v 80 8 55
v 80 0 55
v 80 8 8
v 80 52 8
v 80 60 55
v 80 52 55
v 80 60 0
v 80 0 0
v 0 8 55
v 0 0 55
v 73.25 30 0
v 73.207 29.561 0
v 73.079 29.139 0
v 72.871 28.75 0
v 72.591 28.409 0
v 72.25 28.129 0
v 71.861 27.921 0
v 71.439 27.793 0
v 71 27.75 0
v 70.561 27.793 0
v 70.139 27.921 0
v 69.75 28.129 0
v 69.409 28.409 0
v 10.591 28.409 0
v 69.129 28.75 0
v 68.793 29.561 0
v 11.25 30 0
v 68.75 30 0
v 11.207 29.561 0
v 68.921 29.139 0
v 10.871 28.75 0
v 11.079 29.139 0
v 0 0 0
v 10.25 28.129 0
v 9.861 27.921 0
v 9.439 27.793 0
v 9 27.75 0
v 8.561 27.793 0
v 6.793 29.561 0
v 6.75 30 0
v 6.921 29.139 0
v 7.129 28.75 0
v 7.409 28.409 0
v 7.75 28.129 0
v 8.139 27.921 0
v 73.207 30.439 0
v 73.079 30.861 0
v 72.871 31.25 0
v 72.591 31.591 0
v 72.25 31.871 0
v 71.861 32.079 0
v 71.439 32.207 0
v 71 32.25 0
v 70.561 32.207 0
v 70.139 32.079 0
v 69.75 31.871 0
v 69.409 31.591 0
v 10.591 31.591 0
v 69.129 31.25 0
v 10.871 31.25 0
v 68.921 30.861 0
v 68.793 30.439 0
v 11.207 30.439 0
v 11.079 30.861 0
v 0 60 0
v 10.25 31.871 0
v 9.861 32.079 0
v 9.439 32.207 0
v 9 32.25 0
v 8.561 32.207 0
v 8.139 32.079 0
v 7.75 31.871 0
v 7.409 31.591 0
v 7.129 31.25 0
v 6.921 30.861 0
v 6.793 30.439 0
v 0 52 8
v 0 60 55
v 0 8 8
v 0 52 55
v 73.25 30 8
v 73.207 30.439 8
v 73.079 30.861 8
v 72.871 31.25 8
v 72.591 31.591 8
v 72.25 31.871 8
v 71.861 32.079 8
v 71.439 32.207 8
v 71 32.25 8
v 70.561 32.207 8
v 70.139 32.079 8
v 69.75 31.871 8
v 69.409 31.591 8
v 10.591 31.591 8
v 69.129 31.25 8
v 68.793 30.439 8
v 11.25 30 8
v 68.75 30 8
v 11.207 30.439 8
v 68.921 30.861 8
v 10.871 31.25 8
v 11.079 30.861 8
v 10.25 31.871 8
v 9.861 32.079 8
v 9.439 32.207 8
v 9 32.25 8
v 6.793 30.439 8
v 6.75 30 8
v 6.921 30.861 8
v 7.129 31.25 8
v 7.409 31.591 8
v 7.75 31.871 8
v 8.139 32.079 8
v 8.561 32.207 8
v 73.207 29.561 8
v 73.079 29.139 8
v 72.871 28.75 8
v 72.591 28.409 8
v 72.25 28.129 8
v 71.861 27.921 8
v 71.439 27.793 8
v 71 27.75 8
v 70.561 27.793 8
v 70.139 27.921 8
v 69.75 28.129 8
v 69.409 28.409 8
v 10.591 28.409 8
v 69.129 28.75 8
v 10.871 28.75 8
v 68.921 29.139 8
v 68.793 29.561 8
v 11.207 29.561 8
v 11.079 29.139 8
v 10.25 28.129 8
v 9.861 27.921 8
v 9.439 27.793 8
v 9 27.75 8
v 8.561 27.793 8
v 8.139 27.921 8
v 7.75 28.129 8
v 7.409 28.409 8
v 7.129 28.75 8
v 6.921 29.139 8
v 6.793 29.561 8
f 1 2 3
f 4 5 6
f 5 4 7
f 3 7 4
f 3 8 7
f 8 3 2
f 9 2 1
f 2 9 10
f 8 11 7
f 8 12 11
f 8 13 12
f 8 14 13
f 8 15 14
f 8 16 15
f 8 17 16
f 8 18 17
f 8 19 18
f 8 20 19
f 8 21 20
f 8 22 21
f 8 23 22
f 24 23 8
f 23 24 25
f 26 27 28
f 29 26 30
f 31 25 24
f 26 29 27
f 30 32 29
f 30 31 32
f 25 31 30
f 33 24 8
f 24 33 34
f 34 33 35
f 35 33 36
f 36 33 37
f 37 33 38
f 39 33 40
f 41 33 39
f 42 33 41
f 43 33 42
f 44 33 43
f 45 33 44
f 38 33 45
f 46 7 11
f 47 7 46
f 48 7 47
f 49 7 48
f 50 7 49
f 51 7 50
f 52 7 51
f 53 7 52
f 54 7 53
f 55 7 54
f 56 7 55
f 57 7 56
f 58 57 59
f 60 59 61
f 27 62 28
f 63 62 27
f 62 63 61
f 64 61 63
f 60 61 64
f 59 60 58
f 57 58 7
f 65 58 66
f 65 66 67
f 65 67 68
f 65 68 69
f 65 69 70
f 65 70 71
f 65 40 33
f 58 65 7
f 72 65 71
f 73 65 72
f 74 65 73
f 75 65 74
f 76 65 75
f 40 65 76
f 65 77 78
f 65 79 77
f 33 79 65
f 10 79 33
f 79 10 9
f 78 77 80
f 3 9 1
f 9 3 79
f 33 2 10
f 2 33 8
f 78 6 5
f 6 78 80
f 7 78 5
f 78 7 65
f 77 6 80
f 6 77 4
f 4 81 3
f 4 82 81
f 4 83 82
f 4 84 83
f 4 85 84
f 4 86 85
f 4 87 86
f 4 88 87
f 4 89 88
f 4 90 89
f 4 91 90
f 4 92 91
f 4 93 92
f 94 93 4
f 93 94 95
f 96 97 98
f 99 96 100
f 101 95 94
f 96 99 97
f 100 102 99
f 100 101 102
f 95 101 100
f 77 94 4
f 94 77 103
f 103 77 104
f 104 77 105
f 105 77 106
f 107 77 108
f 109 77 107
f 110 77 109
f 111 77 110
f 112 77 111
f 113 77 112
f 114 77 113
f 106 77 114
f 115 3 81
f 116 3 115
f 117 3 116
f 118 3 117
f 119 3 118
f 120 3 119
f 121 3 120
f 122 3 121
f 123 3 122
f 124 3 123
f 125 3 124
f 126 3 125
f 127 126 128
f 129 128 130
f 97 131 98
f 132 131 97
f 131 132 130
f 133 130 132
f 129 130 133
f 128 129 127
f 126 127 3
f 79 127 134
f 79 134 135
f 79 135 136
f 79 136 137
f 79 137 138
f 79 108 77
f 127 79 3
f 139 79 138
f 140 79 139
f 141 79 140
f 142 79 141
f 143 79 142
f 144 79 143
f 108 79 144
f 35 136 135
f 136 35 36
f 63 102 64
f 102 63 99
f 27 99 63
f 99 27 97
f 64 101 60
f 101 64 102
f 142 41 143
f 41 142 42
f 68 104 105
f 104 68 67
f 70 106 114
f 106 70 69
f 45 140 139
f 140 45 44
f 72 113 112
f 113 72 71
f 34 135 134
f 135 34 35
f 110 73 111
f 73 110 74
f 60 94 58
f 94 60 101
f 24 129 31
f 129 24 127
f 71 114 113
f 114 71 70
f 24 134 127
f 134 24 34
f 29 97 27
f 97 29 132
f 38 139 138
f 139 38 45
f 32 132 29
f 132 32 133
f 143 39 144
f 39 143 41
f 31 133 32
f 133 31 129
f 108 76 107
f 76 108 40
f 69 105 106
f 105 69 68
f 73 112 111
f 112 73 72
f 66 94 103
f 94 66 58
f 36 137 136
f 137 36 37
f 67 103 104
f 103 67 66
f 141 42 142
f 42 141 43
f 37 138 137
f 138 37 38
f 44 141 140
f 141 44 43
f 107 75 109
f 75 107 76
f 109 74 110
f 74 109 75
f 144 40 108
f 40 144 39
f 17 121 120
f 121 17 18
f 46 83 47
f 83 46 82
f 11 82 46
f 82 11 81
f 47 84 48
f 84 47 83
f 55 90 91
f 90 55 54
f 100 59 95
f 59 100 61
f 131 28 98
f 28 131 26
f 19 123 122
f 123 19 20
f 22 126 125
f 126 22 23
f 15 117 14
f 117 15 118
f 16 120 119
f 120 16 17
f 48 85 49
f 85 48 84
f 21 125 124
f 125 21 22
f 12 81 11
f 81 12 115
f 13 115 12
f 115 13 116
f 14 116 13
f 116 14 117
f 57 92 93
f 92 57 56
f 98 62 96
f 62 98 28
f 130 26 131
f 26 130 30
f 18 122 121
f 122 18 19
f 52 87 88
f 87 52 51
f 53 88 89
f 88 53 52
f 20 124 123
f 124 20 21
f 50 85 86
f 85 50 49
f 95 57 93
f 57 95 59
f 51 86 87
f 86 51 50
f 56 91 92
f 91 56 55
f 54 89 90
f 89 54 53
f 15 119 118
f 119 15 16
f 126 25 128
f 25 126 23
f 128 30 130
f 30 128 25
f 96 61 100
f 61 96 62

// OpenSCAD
$fn = 32;

// ----------------------------------------------------------------------
// U-bracket: 80 x 60 x 55 mm
// ----------------------------------------------------------------------

// --- parameters (mm) ---
length = 80;              // outer length, X
width = 60;               // outer width, Y
height = 55;              // upright height, Z
thick = 8;                // wall thickness
hole_d = 4.5;             // clearance for M4

module hole_z(px, py) {
  translate([px, py, -0.5]) cylinder(h = thick + 1, d = hole_d);
}
module hole_y_pz(pz) {
  /* through both uprights along Y */
  translate([0, -0.5, pz]) rotate([-90, 0, 0]) cylinder(h = width + 1, d = hole_d);
}

module base() {
  cube([length, width, thick]);
}

module uprights() {
  cube([length, thick, height]);
  translate([0, width - thick, 0]) cube([length, thick, height]);
}

difference() {
  union() {
    base();
    uprights();
  }
  hole_z(9, 30);
  hole_z(71, 30);
}
